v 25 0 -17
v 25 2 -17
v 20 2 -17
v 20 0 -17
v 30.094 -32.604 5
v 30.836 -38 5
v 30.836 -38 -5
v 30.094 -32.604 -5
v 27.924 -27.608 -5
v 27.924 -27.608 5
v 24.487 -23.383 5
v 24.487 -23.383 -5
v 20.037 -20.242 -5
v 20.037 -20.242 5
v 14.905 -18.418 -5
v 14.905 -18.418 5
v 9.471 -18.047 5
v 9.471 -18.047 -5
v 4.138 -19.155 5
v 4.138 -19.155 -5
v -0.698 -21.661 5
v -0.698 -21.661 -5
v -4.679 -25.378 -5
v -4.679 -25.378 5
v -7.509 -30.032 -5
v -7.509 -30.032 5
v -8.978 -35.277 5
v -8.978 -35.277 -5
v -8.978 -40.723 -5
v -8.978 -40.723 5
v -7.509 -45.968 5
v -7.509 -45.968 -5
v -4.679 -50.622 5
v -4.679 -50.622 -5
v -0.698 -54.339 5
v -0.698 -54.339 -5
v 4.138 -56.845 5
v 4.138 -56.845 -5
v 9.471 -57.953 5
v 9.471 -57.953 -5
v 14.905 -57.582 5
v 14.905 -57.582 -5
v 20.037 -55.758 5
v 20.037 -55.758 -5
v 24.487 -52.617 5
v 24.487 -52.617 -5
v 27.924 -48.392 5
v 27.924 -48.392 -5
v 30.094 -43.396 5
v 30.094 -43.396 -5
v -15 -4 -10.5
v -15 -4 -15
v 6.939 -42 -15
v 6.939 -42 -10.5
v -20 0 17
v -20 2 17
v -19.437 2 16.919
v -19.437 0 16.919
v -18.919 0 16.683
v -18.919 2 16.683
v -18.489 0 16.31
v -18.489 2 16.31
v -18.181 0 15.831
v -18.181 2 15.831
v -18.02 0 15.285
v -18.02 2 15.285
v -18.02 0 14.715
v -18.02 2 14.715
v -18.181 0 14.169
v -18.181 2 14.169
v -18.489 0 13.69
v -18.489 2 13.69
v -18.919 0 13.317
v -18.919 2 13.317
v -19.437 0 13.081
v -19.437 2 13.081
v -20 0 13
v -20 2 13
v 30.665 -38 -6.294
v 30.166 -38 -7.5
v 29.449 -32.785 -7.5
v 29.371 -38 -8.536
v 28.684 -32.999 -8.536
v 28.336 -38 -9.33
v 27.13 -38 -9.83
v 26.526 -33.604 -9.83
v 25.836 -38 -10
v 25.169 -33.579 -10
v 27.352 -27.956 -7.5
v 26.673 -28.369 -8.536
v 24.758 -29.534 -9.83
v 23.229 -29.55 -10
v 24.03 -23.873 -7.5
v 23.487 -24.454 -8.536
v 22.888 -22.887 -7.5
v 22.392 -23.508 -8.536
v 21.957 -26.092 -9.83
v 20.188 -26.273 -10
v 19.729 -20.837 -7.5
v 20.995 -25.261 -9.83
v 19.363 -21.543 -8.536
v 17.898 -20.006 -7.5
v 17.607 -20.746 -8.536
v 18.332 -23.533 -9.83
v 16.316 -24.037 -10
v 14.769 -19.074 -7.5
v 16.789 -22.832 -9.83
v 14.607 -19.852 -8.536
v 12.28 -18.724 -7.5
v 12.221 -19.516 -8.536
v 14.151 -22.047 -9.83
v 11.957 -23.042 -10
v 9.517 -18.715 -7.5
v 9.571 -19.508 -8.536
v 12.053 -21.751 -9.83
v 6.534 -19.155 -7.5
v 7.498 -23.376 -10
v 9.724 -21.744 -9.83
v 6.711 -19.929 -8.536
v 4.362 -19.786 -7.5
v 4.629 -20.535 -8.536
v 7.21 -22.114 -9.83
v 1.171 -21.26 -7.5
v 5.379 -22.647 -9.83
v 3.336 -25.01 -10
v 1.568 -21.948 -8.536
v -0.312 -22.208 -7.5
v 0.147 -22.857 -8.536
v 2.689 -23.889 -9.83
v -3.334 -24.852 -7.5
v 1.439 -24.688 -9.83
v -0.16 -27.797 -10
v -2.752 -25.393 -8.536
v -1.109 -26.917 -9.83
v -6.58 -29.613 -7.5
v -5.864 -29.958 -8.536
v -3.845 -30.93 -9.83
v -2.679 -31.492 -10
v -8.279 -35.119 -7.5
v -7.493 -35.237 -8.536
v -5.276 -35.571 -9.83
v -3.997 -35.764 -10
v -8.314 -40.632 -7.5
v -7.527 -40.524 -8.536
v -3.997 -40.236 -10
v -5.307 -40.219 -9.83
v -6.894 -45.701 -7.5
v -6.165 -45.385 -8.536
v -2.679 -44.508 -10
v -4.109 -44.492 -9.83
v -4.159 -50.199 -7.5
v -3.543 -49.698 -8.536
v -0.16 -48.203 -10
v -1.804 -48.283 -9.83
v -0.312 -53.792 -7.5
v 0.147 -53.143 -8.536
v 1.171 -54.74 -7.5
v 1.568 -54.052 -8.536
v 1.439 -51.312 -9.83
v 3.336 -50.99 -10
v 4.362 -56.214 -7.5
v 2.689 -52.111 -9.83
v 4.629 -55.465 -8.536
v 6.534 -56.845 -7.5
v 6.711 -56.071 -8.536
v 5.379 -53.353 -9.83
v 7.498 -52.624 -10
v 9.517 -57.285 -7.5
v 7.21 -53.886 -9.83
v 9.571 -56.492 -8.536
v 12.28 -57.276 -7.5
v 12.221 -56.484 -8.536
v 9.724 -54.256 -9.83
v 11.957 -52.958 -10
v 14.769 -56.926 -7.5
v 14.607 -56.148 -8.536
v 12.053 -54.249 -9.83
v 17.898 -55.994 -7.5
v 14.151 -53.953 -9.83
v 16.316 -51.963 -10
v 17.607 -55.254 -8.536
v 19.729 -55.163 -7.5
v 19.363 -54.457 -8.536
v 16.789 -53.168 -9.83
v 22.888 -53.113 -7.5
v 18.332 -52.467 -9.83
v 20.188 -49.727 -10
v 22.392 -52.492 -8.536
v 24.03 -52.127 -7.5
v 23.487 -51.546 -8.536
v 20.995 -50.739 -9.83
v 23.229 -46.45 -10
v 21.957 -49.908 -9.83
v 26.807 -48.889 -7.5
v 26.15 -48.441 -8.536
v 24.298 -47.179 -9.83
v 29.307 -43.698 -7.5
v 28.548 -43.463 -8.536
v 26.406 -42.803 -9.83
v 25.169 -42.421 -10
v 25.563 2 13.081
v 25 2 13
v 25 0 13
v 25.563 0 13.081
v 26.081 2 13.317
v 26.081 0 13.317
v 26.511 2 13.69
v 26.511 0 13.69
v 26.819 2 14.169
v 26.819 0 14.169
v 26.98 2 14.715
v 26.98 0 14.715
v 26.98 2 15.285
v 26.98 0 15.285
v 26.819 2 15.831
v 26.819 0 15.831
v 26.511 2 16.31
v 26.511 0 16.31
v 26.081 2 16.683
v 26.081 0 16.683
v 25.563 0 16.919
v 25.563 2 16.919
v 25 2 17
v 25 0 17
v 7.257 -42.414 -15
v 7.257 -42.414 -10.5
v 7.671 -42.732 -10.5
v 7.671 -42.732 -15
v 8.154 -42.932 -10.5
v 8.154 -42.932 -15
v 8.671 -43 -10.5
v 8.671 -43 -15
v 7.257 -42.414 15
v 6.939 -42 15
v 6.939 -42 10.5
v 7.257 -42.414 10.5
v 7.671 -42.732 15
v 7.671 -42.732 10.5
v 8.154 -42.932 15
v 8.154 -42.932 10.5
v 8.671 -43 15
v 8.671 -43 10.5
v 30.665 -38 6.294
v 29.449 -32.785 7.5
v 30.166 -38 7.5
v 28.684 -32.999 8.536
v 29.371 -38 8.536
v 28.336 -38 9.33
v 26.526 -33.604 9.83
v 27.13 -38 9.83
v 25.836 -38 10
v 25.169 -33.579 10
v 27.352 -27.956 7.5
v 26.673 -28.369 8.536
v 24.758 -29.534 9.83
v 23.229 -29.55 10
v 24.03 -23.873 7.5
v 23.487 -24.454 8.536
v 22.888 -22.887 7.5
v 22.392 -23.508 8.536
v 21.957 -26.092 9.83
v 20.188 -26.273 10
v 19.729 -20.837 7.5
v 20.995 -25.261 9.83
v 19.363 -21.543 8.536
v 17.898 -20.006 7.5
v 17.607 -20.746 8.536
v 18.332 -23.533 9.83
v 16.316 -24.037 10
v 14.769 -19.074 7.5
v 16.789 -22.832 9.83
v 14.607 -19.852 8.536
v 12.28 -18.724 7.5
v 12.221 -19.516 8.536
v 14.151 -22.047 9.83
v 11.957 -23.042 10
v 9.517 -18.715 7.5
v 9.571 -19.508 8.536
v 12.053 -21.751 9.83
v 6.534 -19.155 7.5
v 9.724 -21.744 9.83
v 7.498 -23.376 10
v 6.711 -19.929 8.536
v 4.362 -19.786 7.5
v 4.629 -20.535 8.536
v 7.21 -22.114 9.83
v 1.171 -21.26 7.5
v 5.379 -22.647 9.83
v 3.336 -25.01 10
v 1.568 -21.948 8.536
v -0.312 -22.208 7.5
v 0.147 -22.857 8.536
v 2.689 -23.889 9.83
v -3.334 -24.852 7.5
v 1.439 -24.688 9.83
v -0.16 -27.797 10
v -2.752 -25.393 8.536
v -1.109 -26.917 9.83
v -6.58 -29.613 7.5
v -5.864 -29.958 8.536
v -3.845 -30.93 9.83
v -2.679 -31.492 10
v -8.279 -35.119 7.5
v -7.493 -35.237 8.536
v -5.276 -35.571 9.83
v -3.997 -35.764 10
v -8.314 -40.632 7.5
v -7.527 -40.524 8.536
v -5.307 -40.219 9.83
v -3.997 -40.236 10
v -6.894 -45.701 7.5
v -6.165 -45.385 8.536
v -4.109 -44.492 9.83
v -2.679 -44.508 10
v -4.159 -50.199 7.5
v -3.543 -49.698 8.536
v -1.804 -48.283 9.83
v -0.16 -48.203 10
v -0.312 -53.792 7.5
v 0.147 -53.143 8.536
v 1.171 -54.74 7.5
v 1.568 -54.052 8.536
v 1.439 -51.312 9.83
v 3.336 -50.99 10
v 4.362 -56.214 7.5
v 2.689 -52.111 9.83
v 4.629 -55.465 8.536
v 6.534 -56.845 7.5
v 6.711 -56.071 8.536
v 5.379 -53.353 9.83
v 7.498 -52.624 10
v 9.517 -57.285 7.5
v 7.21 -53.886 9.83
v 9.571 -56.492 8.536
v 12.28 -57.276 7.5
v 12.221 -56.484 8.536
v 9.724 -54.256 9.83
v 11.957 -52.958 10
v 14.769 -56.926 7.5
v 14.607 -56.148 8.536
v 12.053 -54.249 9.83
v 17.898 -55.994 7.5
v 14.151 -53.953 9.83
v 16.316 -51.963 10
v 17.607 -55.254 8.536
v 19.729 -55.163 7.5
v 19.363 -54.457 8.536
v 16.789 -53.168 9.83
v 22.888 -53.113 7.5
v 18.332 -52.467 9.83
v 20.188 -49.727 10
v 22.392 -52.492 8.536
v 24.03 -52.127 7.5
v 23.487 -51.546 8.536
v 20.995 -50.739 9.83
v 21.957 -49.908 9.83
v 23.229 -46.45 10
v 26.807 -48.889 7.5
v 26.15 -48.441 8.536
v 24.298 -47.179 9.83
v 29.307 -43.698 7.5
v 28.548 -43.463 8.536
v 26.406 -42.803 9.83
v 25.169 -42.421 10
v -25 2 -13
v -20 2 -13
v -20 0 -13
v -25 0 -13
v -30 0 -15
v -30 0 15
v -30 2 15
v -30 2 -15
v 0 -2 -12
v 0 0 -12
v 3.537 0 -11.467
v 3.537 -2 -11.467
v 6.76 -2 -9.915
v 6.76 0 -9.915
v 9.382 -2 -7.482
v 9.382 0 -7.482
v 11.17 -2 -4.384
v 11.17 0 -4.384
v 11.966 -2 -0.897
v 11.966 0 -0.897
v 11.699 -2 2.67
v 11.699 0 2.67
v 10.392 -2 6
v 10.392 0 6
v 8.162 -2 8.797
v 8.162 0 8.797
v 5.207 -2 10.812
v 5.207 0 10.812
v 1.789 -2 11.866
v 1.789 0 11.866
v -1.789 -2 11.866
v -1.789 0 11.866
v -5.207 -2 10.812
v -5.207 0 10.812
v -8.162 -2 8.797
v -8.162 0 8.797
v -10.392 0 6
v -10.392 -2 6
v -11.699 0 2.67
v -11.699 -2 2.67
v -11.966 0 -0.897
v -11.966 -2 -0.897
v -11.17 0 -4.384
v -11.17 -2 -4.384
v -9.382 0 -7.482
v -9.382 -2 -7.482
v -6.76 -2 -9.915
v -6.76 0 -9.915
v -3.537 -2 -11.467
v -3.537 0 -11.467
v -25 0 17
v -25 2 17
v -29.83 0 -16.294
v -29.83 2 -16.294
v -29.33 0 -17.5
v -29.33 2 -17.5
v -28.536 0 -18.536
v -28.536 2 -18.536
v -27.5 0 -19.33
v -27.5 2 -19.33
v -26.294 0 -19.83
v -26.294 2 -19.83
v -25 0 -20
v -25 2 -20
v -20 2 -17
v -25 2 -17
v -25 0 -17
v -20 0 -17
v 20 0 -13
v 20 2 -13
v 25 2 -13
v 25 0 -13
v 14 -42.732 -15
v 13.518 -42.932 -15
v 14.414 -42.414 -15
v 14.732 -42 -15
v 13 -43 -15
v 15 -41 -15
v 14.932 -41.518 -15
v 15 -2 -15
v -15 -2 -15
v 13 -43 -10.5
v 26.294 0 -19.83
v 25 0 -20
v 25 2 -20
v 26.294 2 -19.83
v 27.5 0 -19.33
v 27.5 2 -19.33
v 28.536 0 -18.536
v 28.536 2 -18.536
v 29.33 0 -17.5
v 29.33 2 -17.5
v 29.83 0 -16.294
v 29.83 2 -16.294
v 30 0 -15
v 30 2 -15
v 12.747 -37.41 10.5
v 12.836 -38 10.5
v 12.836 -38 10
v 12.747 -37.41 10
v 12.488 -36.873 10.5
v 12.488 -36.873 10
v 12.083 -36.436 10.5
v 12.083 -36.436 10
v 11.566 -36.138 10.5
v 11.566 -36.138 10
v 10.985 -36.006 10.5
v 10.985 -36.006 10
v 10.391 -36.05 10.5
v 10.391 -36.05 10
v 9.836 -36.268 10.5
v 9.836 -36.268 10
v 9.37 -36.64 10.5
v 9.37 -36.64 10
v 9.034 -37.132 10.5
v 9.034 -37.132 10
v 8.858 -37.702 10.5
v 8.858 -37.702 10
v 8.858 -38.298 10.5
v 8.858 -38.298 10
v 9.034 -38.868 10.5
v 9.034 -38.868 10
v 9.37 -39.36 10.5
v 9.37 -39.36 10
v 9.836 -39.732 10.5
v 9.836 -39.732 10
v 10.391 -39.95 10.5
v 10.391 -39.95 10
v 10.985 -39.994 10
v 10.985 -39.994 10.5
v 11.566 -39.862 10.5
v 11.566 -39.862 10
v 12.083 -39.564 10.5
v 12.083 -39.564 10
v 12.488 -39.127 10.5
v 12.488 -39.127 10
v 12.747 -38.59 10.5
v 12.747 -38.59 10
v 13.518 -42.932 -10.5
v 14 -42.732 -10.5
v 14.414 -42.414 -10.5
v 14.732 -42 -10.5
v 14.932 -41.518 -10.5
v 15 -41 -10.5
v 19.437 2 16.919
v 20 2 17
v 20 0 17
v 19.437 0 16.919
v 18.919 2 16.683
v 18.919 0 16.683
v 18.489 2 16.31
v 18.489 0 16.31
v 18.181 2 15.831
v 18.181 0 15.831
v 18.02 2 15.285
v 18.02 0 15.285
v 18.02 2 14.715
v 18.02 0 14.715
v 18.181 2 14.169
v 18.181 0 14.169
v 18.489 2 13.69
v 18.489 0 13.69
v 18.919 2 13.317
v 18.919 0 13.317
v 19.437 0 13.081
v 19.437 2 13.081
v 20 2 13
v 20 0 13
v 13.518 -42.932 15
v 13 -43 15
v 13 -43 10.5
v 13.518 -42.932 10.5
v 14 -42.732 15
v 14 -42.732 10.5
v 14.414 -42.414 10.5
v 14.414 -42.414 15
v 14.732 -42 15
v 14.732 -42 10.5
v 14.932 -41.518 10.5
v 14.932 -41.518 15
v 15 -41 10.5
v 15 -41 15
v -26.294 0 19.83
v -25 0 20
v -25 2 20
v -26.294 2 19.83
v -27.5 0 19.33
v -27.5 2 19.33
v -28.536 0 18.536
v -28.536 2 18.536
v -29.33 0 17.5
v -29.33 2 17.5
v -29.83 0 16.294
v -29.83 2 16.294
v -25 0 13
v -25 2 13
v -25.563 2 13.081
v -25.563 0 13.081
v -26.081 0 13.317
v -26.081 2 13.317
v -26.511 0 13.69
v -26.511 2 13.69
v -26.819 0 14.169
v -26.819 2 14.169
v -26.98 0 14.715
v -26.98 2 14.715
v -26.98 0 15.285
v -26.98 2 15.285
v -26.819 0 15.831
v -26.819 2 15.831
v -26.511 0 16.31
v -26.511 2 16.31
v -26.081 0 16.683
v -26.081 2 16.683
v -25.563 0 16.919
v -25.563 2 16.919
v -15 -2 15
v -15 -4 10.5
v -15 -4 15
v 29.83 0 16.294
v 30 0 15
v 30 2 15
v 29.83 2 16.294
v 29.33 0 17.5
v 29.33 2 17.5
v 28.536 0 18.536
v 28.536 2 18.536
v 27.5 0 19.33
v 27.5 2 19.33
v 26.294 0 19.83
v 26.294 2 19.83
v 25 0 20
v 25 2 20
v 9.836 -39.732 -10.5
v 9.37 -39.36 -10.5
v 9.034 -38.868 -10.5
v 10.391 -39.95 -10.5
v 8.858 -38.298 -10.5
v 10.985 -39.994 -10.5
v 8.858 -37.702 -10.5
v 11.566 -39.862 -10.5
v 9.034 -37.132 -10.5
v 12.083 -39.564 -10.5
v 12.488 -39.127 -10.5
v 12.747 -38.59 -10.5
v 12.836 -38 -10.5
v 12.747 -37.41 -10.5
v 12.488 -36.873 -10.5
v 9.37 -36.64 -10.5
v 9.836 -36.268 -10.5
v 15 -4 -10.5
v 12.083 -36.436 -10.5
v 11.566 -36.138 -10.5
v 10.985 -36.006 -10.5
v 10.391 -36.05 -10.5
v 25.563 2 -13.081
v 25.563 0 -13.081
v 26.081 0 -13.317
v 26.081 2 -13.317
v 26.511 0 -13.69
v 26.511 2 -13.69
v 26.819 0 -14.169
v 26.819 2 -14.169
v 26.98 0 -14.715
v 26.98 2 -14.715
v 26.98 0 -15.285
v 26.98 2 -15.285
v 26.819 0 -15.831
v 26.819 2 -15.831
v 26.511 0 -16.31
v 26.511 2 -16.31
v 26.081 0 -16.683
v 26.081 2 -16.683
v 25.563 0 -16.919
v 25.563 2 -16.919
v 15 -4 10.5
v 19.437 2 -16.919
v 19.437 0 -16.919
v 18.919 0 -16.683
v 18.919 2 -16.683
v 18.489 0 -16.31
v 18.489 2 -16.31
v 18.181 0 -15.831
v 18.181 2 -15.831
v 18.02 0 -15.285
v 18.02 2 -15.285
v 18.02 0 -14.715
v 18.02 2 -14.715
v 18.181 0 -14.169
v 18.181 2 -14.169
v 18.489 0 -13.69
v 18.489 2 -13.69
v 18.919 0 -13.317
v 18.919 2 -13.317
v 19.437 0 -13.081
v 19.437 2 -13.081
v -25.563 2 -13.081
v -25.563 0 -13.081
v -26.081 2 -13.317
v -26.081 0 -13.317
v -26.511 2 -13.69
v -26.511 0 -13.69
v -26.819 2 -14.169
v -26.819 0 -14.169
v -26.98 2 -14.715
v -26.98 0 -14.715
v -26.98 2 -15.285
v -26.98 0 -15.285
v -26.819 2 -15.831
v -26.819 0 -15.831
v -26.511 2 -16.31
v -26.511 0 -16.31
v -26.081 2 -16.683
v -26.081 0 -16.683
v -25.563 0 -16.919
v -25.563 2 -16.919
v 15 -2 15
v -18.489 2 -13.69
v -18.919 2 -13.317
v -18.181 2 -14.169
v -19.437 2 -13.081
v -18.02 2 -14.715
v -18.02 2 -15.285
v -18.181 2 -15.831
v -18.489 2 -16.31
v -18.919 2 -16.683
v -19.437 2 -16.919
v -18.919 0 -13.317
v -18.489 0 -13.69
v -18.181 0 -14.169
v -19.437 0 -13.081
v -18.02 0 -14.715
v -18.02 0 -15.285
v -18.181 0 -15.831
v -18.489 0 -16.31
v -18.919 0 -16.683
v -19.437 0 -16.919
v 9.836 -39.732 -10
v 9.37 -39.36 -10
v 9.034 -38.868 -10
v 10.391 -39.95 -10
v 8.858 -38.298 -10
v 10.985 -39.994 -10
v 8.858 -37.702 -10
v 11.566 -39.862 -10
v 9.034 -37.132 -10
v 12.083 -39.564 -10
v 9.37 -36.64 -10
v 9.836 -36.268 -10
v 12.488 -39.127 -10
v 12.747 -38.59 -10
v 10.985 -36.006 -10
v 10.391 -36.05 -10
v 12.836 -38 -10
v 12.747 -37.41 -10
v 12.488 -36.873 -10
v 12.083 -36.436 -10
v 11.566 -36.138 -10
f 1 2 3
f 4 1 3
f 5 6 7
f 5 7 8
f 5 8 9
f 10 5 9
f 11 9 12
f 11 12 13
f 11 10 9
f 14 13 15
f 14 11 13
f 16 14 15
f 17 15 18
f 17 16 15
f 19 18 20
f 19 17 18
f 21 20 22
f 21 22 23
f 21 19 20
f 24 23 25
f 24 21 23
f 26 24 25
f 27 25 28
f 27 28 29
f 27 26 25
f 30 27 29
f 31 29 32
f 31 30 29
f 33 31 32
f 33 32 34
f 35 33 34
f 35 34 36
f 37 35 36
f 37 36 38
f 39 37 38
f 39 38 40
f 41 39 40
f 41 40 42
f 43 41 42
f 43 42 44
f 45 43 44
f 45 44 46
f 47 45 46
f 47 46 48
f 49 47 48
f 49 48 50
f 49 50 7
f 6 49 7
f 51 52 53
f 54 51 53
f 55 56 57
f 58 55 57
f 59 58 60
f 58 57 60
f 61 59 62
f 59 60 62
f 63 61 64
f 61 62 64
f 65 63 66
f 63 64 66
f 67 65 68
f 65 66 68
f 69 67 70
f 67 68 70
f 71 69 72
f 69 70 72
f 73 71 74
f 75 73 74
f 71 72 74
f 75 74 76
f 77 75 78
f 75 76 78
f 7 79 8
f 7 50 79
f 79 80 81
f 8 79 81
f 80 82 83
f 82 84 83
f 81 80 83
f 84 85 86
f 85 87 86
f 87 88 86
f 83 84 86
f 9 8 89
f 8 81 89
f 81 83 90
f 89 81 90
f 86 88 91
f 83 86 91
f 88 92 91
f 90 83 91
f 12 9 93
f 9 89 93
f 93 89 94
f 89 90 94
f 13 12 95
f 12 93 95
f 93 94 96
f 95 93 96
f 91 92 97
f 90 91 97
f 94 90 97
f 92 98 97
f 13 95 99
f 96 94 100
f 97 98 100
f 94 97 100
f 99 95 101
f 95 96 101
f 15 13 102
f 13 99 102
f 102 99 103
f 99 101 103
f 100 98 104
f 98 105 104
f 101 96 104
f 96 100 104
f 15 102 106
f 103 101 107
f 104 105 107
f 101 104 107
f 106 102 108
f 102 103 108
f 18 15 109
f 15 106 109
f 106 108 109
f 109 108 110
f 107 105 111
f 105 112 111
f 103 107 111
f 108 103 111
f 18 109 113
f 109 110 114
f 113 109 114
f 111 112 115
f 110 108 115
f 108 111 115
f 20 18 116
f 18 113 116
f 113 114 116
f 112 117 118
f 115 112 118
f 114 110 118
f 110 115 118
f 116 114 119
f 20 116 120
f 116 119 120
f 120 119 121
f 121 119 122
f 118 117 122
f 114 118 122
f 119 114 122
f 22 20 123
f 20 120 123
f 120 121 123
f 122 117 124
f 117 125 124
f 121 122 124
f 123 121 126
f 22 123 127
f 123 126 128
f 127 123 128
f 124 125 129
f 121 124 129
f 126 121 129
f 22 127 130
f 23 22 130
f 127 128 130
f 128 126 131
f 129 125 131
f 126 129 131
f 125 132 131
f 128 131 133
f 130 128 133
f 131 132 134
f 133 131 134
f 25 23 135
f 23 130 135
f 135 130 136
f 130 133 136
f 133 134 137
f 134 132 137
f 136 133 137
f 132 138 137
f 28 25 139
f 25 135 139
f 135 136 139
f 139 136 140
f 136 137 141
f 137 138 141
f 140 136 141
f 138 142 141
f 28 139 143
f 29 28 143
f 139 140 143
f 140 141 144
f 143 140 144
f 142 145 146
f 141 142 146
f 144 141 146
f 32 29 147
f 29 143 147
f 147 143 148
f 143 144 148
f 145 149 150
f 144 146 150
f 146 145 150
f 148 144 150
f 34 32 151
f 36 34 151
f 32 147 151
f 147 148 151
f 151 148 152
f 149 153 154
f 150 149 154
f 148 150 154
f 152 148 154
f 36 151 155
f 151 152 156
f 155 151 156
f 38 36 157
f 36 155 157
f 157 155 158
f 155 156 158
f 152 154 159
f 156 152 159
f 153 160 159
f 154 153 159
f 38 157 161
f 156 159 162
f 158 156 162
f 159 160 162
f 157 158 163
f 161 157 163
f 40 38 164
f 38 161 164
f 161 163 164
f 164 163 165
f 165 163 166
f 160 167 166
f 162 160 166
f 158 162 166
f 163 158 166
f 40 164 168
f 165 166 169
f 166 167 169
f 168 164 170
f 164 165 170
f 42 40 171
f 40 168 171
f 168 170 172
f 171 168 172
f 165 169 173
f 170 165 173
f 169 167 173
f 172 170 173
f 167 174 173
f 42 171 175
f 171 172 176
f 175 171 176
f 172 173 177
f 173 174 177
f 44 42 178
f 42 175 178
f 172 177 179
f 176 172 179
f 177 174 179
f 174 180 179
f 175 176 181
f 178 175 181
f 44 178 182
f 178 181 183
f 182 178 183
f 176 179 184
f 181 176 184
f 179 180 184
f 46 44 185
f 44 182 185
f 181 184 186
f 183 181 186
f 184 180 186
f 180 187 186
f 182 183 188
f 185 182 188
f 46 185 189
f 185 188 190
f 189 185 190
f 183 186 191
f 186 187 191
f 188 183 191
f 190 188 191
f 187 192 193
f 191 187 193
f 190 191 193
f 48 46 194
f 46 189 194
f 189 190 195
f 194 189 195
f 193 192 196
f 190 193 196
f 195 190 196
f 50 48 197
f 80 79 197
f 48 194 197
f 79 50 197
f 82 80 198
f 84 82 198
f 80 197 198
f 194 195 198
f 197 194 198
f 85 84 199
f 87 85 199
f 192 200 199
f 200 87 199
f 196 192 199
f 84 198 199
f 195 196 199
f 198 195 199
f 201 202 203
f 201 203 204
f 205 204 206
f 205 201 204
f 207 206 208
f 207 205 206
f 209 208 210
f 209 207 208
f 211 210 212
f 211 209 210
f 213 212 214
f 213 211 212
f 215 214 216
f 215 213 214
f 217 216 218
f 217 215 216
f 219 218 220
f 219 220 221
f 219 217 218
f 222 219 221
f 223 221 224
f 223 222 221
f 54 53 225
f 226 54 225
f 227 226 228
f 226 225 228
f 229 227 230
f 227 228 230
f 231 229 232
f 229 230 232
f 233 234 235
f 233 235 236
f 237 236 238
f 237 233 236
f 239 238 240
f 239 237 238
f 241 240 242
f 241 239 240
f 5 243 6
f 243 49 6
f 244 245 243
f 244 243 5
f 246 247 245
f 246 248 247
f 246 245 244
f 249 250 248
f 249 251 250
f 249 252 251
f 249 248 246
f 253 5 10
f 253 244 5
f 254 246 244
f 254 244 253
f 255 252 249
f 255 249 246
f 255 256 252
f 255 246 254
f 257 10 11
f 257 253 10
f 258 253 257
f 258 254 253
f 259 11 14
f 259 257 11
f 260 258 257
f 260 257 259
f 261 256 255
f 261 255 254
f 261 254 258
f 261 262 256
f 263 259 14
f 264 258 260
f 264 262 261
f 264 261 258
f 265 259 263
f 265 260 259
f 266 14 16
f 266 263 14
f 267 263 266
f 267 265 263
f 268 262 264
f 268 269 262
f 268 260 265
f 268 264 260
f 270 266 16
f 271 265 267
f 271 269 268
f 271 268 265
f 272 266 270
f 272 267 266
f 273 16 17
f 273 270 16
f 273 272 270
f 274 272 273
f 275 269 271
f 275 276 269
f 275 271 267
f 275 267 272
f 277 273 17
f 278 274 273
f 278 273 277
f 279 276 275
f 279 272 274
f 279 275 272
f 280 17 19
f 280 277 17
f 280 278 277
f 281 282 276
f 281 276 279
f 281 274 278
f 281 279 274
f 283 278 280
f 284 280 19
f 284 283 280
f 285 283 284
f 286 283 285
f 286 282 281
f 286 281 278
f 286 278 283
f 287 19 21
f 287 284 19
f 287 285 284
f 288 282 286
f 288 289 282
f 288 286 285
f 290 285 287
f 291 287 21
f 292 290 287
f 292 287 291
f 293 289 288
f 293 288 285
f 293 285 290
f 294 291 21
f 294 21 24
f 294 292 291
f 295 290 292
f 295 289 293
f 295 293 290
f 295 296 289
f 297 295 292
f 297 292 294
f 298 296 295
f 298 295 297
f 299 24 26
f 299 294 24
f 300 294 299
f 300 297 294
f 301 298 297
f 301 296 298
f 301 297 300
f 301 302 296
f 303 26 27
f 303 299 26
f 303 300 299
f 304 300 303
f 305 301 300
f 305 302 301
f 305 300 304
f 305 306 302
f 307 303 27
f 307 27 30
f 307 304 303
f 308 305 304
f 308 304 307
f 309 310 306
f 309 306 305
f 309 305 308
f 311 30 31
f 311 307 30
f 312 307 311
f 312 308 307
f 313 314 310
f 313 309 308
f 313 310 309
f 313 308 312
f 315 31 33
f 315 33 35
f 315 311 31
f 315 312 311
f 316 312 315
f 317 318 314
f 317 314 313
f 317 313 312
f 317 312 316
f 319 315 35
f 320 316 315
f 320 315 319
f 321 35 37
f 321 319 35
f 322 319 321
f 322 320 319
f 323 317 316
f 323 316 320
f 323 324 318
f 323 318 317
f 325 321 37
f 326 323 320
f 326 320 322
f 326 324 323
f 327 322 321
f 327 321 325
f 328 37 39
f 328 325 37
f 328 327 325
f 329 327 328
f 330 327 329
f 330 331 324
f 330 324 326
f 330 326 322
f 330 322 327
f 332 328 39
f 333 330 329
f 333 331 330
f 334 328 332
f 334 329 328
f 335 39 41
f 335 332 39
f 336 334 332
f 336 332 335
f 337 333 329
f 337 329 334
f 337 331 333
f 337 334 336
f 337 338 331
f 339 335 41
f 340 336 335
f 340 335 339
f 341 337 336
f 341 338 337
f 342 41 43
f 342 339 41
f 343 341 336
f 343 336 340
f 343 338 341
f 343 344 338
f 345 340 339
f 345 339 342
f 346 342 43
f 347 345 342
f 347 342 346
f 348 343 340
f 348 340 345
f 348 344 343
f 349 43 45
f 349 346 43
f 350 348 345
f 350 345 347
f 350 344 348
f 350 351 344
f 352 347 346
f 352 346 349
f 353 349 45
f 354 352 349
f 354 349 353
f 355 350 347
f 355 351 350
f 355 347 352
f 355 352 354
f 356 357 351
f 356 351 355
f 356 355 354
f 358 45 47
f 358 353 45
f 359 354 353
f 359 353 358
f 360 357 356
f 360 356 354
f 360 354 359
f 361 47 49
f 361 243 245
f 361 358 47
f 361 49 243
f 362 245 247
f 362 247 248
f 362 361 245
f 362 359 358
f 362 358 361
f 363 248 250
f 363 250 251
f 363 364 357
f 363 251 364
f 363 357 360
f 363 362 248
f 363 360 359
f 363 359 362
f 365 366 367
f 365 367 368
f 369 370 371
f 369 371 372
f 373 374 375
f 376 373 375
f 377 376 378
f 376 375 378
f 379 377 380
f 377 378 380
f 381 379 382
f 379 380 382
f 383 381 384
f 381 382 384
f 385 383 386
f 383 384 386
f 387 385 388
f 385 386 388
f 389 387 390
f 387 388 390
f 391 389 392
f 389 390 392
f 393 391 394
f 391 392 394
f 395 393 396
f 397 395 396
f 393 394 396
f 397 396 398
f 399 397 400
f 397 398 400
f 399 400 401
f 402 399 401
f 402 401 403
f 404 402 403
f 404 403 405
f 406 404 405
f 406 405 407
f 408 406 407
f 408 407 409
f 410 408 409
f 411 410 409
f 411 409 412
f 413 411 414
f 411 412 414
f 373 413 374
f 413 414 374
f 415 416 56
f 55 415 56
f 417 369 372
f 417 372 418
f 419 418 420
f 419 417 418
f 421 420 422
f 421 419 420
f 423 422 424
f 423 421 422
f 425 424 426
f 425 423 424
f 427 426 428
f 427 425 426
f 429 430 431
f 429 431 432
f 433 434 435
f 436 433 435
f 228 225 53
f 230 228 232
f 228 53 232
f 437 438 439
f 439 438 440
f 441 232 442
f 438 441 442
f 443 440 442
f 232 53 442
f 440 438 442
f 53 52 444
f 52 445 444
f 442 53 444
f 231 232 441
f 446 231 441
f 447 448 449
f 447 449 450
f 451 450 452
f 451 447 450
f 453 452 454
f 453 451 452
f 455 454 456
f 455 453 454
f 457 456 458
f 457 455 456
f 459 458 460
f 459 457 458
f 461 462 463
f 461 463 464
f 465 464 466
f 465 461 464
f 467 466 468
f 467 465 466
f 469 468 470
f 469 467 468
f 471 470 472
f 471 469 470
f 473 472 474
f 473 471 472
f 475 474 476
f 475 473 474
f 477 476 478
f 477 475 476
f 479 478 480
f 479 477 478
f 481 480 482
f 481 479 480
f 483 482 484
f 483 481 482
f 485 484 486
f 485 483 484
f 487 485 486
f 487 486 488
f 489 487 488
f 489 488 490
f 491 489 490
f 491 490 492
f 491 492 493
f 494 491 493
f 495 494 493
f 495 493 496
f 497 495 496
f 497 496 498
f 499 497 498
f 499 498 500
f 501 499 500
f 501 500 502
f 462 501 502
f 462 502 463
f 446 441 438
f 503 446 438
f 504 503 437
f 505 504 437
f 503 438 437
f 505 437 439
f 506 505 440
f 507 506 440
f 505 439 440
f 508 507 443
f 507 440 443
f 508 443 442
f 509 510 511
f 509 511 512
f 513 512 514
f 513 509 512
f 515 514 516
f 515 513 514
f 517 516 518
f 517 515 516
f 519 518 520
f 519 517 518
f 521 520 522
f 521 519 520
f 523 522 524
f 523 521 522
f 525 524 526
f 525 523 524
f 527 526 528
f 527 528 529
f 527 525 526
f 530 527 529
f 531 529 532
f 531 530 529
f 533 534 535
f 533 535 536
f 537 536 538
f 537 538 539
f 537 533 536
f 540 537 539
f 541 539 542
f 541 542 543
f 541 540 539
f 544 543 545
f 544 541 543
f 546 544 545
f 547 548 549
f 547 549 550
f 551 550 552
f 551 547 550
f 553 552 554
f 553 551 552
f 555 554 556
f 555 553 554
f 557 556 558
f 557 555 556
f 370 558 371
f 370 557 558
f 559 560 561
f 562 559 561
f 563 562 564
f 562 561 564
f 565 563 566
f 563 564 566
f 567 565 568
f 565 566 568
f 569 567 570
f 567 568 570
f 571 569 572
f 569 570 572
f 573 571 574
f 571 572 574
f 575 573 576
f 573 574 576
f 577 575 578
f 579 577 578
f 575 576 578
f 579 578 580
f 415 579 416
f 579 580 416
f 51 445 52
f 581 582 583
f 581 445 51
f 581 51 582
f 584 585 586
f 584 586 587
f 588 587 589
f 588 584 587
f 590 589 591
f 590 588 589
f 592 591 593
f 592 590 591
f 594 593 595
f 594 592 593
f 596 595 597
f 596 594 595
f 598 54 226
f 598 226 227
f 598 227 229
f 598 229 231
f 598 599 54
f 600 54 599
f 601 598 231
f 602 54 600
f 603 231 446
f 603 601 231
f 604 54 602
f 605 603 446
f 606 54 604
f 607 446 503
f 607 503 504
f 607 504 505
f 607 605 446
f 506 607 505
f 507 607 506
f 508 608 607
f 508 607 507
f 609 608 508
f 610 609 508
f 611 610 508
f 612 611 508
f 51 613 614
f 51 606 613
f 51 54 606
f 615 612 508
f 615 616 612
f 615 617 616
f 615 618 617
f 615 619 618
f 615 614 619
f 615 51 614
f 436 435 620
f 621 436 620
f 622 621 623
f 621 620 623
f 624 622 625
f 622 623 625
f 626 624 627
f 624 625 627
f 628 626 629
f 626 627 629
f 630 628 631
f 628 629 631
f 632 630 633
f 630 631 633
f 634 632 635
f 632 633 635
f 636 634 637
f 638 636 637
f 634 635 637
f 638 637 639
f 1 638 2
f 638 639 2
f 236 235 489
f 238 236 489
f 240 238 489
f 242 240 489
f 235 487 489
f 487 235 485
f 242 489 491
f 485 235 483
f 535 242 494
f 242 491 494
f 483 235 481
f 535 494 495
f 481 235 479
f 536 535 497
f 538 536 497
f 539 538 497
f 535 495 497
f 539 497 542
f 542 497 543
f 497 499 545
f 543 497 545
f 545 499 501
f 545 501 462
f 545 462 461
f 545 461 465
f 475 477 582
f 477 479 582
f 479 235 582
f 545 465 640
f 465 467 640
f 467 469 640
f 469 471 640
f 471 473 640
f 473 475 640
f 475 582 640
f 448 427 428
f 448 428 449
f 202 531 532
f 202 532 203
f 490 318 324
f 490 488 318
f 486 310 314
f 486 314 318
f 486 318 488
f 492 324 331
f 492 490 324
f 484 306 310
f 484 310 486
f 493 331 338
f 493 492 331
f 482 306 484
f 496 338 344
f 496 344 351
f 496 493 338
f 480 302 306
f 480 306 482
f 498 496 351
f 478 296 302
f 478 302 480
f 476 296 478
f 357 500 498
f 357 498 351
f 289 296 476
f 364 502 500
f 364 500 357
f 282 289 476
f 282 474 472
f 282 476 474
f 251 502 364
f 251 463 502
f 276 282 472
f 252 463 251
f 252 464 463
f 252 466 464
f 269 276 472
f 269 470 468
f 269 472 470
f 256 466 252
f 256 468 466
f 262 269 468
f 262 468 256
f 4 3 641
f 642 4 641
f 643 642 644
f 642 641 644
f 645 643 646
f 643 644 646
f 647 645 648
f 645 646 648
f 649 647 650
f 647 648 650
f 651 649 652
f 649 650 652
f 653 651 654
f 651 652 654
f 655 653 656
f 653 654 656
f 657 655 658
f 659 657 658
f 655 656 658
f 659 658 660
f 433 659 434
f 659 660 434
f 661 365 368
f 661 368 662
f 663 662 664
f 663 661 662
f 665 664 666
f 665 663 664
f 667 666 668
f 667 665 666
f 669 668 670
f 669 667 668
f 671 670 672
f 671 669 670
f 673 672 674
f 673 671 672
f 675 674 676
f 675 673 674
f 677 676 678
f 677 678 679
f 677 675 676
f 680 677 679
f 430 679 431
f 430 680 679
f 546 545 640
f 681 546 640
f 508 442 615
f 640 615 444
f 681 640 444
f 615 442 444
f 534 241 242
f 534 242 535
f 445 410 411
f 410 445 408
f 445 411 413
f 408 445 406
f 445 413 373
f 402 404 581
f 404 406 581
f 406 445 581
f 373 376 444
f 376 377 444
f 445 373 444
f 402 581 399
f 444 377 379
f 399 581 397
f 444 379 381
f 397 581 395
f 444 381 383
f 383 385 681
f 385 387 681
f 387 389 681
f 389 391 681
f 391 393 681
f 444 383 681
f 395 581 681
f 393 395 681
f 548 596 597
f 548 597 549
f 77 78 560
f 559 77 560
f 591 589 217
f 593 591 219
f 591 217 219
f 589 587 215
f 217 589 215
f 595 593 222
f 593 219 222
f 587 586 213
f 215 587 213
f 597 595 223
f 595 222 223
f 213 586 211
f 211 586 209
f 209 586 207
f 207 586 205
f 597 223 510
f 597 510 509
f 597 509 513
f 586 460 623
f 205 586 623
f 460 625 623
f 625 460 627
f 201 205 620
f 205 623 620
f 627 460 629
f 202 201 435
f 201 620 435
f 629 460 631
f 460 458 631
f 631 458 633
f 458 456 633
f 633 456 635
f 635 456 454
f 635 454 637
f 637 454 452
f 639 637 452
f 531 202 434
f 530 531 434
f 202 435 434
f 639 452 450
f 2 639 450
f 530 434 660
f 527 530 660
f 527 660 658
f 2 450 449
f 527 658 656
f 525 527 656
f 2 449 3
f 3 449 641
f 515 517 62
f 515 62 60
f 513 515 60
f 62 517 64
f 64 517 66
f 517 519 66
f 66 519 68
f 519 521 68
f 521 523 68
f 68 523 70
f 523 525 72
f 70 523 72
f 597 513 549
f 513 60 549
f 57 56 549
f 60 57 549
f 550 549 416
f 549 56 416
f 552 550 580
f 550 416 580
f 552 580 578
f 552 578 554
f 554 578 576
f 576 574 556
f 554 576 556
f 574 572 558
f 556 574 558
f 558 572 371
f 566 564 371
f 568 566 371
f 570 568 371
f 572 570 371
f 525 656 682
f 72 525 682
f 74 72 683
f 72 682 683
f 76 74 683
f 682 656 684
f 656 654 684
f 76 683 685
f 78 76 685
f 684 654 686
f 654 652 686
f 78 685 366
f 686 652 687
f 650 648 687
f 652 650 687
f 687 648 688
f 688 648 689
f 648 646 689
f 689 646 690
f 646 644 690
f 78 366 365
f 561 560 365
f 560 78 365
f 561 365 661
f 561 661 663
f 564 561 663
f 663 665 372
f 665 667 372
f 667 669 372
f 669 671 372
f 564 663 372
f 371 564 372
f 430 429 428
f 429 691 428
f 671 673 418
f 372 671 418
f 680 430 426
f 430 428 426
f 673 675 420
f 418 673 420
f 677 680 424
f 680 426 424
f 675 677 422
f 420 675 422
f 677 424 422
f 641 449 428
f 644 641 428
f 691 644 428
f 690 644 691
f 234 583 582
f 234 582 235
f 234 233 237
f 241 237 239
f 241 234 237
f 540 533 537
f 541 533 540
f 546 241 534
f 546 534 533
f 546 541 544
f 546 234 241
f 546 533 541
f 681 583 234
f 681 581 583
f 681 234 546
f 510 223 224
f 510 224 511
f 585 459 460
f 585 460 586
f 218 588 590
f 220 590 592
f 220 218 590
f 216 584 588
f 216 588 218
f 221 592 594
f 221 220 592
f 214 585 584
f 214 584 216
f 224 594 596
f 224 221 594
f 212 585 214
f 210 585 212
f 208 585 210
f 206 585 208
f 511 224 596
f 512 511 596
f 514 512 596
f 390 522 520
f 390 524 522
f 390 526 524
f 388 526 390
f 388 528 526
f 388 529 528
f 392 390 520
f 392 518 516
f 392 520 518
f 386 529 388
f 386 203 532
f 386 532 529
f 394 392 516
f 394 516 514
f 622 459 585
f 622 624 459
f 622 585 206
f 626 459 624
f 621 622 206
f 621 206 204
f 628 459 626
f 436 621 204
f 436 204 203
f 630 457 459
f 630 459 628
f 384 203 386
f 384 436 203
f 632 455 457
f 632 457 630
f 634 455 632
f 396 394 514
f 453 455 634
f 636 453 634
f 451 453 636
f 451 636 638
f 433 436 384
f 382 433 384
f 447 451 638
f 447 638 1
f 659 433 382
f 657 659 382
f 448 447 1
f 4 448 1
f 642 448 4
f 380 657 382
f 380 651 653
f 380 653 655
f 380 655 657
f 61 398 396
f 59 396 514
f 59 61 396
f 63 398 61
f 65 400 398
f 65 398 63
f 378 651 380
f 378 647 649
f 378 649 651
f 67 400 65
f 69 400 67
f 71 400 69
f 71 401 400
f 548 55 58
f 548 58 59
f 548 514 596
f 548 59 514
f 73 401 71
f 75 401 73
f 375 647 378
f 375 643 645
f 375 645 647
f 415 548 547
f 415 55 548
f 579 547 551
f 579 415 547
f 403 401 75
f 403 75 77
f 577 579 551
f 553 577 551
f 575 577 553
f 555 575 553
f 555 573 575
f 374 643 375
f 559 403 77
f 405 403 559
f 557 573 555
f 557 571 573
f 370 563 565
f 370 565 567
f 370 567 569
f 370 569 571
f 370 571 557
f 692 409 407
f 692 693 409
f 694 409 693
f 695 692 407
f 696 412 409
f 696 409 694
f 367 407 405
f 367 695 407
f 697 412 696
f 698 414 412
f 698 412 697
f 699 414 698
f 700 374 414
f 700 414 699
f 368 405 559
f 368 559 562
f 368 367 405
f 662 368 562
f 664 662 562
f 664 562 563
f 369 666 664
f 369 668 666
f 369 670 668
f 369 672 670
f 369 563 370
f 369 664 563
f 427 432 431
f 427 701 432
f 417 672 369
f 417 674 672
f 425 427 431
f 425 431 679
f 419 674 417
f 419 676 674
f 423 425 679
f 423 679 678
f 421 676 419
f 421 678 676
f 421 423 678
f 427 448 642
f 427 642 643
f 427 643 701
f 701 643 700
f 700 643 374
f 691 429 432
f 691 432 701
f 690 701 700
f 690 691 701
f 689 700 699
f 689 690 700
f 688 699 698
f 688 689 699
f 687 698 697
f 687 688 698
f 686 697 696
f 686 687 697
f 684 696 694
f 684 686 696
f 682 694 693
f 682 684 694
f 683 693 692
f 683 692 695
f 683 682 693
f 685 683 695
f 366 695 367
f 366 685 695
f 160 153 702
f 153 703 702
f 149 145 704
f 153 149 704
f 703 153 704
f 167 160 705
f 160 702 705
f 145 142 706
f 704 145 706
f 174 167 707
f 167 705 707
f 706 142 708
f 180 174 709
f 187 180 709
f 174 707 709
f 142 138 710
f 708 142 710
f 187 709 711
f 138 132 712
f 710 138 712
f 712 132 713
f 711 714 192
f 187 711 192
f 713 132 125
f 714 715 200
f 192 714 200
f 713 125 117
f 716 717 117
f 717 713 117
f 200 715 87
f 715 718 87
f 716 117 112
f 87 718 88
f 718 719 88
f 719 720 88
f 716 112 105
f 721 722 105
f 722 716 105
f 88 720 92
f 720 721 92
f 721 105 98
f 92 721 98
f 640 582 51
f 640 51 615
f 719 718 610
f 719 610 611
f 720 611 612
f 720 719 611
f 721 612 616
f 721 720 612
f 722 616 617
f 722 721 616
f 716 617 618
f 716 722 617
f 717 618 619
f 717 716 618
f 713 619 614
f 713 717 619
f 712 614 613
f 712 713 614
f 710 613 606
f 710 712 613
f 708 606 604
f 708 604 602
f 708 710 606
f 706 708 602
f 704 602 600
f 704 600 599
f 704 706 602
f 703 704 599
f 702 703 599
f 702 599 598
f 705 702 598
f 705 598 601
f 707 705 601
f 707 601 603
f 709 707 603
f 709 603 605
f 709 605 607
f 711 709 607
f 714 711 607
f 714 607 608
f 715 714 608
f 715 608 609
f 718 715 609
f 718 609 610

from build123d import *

# Parameters (mm, degrees)
BOSS_EXTRUDE1_DEPTH = 2
CUT_EXTRUDE1_DEPTH  = 2
SKETCH3_R           = 12
BOSS_EXTRUDE2_DEPTH = 2
SKETCH4_W           = 30
SKETCH4_H           = 30
BOSS_EXTRUDE3_DEPTH = 2
SKETCH5_R           = 2
BOSS_EXTRUDE4_DEPTH = 4.5
SKETCH6_R           = 2
BOSS_EXTRUDE5_DEPTH = 30
SKETCH7_R           = 20
BOSS_EXTRUDE6_DEPTH = 10
FILLET1_R           = 5


with BuildPart() as part:
    # Sketch1 → Boss-Extrude1 (new body)
    with BuildSketch(Plane(origin=(0, 0, 0), x_dir=(1, 0, 0), z_dir=(0, 1, 0))):
        with BuildLine():
            Line((25, -20), (-25, -20))
            ThreePointArc((-25, -20), (-28.535533906, -18.535533906), (-30, -15))
            Line((-30, -15), (-30, 15))
            ThreePointArc((-30, 15), (-28.535533906, 18.535533906), (-25, 20))
            Line((-25, 20), (25, 20))
            ThreePointArc((25, 20), (28.535533906, 18.535533906), (30, 15))
            Line((30, 15), (30, -15))
            ThreePointArc((30, -15), (28.535533906, -18.535533906), (25, -20))
        make_face()
    extrude(amount=BOSS_EXTRUDE1_DEPTH)

    # Sketch2 → Cut-Extrude1 (cut)
    with BuildSketch(Plane(origin=(0, 2, 0), x_dir=(1, 0, 0), z_dir=(0, 1, 0))):
        with BuildLine():
            Line((-25, 17), (-20, 17))
            ThreePointArc((-20, 17), (-18, 15), (-20, 13))
            Line((-20, 13), (-25, 13))
            ThreePointArc((-25, 13), (-27, 15), (-25, 17))
        make_face()
        with BuildLine():
            Line((25, 17), (20, 17))
            ThreePointArc((20, 17), (18, 15), (20, 13))
            Line((20, 13), (25, 13))
            ThreePointArc((25, 13), (27, 15), (25, 17))
        make_face()
        with BuildLine():
            Line((25, -17), (20, -17))
            ThreePointArc((20, -17), (18, -15), (20, -13))
            Line((20, -13), (25, -13))
            ThreePointArc((25, -13), (27, -15), (25, -17))
        make_face()
        with BuildLine():
            Line((-25, -17), (-20, -17))
            ThreePointArc((-20, -17), (-18, -15), (-20, -13))
            Line((-20, -13), (-25, -13))
            ThreePointArc((-25, -13), (-27, -15), (-25, -17))
        make_face()
    extrude(amount=-CUT_EXTRUDE1_DEPTH, mode=Mode.SUBTRACT)

    # Sketch3 → Boss-Extrude2 (add)
    with BuildSketch(Plane.XZ):
        with Locations(Location((0, 0, 0), (0, 0, 270))):
            Circle(SKETCH3_R)
    extrude(amount=BOSS_EXTRUDE2_DEPTH)

    # Sketch4 → Boss-Extrude3 (add)
    with BuildSketch(Plane.XZ.offset(2)):
        Rectangle(SKETCH4_W, SKETCH4_H)
    extrude(amount=BOSS_EXTRUDE3_DEPTH)

    # Sketch5 → Boss-Extrude4 (add)
    with BuildSketch(Plane.XY.offset(15)):
        with BuildLine():
            Line((-15, -4), (6.939310229, -42))
            ThreePointArc((6.939310229, -42), (7.671361037, -42.732050808), (8.671361037, -43))
            Line((8.671361037, -43), (13, -43))
            ThreePointArc((13, -43), (14.414213562, -42.414213562), (15, -41))
            Line((15, -41), (15, -4))
            Line((15, -4), (-15, -4))
        make_face()
        with Locations((10.835680518, -38)):
            Circle(SKETCH5_R, mode=Mode.SUBTRACT)
    boss_extrude4 = extrude(amount=-BOSS_EXTRUDE4_DEPTH)

    # Mirror1: Boss-Extrude4 across plane
    add(boss_extrude4.mirror(Plane.XY))

    # Sketch6 → Boss-Extrude5 (add)
    with BuildSketch(Plane.XY.offset(15)):
        with Locations((10.835680518, -38)):
            Circle(SKETCH6_R)
    extrude(amount=-BOSS_EXTRUDE5_DEPTH)

    # Sketch7 → Boss-Extrude6 (add, symmetric)
    with BuildSketch(Plane.XY):
        with Locations((10.835680518, -38)):
            Circle(SKETCH7_R)
    extrude(amount=BOSS_EXTRUDE6_DEPTH, both=True)

    # Fillet1
    fillet1_edges = [part.edges().sort_by_distance(p)[0] for p in [
        (-9.164319482, -38, -10),
        (-9.164319482, -38, 10),
    ]]
    fillet(fillet1_edges, radius=FILLET1_R)


solid = part.part
